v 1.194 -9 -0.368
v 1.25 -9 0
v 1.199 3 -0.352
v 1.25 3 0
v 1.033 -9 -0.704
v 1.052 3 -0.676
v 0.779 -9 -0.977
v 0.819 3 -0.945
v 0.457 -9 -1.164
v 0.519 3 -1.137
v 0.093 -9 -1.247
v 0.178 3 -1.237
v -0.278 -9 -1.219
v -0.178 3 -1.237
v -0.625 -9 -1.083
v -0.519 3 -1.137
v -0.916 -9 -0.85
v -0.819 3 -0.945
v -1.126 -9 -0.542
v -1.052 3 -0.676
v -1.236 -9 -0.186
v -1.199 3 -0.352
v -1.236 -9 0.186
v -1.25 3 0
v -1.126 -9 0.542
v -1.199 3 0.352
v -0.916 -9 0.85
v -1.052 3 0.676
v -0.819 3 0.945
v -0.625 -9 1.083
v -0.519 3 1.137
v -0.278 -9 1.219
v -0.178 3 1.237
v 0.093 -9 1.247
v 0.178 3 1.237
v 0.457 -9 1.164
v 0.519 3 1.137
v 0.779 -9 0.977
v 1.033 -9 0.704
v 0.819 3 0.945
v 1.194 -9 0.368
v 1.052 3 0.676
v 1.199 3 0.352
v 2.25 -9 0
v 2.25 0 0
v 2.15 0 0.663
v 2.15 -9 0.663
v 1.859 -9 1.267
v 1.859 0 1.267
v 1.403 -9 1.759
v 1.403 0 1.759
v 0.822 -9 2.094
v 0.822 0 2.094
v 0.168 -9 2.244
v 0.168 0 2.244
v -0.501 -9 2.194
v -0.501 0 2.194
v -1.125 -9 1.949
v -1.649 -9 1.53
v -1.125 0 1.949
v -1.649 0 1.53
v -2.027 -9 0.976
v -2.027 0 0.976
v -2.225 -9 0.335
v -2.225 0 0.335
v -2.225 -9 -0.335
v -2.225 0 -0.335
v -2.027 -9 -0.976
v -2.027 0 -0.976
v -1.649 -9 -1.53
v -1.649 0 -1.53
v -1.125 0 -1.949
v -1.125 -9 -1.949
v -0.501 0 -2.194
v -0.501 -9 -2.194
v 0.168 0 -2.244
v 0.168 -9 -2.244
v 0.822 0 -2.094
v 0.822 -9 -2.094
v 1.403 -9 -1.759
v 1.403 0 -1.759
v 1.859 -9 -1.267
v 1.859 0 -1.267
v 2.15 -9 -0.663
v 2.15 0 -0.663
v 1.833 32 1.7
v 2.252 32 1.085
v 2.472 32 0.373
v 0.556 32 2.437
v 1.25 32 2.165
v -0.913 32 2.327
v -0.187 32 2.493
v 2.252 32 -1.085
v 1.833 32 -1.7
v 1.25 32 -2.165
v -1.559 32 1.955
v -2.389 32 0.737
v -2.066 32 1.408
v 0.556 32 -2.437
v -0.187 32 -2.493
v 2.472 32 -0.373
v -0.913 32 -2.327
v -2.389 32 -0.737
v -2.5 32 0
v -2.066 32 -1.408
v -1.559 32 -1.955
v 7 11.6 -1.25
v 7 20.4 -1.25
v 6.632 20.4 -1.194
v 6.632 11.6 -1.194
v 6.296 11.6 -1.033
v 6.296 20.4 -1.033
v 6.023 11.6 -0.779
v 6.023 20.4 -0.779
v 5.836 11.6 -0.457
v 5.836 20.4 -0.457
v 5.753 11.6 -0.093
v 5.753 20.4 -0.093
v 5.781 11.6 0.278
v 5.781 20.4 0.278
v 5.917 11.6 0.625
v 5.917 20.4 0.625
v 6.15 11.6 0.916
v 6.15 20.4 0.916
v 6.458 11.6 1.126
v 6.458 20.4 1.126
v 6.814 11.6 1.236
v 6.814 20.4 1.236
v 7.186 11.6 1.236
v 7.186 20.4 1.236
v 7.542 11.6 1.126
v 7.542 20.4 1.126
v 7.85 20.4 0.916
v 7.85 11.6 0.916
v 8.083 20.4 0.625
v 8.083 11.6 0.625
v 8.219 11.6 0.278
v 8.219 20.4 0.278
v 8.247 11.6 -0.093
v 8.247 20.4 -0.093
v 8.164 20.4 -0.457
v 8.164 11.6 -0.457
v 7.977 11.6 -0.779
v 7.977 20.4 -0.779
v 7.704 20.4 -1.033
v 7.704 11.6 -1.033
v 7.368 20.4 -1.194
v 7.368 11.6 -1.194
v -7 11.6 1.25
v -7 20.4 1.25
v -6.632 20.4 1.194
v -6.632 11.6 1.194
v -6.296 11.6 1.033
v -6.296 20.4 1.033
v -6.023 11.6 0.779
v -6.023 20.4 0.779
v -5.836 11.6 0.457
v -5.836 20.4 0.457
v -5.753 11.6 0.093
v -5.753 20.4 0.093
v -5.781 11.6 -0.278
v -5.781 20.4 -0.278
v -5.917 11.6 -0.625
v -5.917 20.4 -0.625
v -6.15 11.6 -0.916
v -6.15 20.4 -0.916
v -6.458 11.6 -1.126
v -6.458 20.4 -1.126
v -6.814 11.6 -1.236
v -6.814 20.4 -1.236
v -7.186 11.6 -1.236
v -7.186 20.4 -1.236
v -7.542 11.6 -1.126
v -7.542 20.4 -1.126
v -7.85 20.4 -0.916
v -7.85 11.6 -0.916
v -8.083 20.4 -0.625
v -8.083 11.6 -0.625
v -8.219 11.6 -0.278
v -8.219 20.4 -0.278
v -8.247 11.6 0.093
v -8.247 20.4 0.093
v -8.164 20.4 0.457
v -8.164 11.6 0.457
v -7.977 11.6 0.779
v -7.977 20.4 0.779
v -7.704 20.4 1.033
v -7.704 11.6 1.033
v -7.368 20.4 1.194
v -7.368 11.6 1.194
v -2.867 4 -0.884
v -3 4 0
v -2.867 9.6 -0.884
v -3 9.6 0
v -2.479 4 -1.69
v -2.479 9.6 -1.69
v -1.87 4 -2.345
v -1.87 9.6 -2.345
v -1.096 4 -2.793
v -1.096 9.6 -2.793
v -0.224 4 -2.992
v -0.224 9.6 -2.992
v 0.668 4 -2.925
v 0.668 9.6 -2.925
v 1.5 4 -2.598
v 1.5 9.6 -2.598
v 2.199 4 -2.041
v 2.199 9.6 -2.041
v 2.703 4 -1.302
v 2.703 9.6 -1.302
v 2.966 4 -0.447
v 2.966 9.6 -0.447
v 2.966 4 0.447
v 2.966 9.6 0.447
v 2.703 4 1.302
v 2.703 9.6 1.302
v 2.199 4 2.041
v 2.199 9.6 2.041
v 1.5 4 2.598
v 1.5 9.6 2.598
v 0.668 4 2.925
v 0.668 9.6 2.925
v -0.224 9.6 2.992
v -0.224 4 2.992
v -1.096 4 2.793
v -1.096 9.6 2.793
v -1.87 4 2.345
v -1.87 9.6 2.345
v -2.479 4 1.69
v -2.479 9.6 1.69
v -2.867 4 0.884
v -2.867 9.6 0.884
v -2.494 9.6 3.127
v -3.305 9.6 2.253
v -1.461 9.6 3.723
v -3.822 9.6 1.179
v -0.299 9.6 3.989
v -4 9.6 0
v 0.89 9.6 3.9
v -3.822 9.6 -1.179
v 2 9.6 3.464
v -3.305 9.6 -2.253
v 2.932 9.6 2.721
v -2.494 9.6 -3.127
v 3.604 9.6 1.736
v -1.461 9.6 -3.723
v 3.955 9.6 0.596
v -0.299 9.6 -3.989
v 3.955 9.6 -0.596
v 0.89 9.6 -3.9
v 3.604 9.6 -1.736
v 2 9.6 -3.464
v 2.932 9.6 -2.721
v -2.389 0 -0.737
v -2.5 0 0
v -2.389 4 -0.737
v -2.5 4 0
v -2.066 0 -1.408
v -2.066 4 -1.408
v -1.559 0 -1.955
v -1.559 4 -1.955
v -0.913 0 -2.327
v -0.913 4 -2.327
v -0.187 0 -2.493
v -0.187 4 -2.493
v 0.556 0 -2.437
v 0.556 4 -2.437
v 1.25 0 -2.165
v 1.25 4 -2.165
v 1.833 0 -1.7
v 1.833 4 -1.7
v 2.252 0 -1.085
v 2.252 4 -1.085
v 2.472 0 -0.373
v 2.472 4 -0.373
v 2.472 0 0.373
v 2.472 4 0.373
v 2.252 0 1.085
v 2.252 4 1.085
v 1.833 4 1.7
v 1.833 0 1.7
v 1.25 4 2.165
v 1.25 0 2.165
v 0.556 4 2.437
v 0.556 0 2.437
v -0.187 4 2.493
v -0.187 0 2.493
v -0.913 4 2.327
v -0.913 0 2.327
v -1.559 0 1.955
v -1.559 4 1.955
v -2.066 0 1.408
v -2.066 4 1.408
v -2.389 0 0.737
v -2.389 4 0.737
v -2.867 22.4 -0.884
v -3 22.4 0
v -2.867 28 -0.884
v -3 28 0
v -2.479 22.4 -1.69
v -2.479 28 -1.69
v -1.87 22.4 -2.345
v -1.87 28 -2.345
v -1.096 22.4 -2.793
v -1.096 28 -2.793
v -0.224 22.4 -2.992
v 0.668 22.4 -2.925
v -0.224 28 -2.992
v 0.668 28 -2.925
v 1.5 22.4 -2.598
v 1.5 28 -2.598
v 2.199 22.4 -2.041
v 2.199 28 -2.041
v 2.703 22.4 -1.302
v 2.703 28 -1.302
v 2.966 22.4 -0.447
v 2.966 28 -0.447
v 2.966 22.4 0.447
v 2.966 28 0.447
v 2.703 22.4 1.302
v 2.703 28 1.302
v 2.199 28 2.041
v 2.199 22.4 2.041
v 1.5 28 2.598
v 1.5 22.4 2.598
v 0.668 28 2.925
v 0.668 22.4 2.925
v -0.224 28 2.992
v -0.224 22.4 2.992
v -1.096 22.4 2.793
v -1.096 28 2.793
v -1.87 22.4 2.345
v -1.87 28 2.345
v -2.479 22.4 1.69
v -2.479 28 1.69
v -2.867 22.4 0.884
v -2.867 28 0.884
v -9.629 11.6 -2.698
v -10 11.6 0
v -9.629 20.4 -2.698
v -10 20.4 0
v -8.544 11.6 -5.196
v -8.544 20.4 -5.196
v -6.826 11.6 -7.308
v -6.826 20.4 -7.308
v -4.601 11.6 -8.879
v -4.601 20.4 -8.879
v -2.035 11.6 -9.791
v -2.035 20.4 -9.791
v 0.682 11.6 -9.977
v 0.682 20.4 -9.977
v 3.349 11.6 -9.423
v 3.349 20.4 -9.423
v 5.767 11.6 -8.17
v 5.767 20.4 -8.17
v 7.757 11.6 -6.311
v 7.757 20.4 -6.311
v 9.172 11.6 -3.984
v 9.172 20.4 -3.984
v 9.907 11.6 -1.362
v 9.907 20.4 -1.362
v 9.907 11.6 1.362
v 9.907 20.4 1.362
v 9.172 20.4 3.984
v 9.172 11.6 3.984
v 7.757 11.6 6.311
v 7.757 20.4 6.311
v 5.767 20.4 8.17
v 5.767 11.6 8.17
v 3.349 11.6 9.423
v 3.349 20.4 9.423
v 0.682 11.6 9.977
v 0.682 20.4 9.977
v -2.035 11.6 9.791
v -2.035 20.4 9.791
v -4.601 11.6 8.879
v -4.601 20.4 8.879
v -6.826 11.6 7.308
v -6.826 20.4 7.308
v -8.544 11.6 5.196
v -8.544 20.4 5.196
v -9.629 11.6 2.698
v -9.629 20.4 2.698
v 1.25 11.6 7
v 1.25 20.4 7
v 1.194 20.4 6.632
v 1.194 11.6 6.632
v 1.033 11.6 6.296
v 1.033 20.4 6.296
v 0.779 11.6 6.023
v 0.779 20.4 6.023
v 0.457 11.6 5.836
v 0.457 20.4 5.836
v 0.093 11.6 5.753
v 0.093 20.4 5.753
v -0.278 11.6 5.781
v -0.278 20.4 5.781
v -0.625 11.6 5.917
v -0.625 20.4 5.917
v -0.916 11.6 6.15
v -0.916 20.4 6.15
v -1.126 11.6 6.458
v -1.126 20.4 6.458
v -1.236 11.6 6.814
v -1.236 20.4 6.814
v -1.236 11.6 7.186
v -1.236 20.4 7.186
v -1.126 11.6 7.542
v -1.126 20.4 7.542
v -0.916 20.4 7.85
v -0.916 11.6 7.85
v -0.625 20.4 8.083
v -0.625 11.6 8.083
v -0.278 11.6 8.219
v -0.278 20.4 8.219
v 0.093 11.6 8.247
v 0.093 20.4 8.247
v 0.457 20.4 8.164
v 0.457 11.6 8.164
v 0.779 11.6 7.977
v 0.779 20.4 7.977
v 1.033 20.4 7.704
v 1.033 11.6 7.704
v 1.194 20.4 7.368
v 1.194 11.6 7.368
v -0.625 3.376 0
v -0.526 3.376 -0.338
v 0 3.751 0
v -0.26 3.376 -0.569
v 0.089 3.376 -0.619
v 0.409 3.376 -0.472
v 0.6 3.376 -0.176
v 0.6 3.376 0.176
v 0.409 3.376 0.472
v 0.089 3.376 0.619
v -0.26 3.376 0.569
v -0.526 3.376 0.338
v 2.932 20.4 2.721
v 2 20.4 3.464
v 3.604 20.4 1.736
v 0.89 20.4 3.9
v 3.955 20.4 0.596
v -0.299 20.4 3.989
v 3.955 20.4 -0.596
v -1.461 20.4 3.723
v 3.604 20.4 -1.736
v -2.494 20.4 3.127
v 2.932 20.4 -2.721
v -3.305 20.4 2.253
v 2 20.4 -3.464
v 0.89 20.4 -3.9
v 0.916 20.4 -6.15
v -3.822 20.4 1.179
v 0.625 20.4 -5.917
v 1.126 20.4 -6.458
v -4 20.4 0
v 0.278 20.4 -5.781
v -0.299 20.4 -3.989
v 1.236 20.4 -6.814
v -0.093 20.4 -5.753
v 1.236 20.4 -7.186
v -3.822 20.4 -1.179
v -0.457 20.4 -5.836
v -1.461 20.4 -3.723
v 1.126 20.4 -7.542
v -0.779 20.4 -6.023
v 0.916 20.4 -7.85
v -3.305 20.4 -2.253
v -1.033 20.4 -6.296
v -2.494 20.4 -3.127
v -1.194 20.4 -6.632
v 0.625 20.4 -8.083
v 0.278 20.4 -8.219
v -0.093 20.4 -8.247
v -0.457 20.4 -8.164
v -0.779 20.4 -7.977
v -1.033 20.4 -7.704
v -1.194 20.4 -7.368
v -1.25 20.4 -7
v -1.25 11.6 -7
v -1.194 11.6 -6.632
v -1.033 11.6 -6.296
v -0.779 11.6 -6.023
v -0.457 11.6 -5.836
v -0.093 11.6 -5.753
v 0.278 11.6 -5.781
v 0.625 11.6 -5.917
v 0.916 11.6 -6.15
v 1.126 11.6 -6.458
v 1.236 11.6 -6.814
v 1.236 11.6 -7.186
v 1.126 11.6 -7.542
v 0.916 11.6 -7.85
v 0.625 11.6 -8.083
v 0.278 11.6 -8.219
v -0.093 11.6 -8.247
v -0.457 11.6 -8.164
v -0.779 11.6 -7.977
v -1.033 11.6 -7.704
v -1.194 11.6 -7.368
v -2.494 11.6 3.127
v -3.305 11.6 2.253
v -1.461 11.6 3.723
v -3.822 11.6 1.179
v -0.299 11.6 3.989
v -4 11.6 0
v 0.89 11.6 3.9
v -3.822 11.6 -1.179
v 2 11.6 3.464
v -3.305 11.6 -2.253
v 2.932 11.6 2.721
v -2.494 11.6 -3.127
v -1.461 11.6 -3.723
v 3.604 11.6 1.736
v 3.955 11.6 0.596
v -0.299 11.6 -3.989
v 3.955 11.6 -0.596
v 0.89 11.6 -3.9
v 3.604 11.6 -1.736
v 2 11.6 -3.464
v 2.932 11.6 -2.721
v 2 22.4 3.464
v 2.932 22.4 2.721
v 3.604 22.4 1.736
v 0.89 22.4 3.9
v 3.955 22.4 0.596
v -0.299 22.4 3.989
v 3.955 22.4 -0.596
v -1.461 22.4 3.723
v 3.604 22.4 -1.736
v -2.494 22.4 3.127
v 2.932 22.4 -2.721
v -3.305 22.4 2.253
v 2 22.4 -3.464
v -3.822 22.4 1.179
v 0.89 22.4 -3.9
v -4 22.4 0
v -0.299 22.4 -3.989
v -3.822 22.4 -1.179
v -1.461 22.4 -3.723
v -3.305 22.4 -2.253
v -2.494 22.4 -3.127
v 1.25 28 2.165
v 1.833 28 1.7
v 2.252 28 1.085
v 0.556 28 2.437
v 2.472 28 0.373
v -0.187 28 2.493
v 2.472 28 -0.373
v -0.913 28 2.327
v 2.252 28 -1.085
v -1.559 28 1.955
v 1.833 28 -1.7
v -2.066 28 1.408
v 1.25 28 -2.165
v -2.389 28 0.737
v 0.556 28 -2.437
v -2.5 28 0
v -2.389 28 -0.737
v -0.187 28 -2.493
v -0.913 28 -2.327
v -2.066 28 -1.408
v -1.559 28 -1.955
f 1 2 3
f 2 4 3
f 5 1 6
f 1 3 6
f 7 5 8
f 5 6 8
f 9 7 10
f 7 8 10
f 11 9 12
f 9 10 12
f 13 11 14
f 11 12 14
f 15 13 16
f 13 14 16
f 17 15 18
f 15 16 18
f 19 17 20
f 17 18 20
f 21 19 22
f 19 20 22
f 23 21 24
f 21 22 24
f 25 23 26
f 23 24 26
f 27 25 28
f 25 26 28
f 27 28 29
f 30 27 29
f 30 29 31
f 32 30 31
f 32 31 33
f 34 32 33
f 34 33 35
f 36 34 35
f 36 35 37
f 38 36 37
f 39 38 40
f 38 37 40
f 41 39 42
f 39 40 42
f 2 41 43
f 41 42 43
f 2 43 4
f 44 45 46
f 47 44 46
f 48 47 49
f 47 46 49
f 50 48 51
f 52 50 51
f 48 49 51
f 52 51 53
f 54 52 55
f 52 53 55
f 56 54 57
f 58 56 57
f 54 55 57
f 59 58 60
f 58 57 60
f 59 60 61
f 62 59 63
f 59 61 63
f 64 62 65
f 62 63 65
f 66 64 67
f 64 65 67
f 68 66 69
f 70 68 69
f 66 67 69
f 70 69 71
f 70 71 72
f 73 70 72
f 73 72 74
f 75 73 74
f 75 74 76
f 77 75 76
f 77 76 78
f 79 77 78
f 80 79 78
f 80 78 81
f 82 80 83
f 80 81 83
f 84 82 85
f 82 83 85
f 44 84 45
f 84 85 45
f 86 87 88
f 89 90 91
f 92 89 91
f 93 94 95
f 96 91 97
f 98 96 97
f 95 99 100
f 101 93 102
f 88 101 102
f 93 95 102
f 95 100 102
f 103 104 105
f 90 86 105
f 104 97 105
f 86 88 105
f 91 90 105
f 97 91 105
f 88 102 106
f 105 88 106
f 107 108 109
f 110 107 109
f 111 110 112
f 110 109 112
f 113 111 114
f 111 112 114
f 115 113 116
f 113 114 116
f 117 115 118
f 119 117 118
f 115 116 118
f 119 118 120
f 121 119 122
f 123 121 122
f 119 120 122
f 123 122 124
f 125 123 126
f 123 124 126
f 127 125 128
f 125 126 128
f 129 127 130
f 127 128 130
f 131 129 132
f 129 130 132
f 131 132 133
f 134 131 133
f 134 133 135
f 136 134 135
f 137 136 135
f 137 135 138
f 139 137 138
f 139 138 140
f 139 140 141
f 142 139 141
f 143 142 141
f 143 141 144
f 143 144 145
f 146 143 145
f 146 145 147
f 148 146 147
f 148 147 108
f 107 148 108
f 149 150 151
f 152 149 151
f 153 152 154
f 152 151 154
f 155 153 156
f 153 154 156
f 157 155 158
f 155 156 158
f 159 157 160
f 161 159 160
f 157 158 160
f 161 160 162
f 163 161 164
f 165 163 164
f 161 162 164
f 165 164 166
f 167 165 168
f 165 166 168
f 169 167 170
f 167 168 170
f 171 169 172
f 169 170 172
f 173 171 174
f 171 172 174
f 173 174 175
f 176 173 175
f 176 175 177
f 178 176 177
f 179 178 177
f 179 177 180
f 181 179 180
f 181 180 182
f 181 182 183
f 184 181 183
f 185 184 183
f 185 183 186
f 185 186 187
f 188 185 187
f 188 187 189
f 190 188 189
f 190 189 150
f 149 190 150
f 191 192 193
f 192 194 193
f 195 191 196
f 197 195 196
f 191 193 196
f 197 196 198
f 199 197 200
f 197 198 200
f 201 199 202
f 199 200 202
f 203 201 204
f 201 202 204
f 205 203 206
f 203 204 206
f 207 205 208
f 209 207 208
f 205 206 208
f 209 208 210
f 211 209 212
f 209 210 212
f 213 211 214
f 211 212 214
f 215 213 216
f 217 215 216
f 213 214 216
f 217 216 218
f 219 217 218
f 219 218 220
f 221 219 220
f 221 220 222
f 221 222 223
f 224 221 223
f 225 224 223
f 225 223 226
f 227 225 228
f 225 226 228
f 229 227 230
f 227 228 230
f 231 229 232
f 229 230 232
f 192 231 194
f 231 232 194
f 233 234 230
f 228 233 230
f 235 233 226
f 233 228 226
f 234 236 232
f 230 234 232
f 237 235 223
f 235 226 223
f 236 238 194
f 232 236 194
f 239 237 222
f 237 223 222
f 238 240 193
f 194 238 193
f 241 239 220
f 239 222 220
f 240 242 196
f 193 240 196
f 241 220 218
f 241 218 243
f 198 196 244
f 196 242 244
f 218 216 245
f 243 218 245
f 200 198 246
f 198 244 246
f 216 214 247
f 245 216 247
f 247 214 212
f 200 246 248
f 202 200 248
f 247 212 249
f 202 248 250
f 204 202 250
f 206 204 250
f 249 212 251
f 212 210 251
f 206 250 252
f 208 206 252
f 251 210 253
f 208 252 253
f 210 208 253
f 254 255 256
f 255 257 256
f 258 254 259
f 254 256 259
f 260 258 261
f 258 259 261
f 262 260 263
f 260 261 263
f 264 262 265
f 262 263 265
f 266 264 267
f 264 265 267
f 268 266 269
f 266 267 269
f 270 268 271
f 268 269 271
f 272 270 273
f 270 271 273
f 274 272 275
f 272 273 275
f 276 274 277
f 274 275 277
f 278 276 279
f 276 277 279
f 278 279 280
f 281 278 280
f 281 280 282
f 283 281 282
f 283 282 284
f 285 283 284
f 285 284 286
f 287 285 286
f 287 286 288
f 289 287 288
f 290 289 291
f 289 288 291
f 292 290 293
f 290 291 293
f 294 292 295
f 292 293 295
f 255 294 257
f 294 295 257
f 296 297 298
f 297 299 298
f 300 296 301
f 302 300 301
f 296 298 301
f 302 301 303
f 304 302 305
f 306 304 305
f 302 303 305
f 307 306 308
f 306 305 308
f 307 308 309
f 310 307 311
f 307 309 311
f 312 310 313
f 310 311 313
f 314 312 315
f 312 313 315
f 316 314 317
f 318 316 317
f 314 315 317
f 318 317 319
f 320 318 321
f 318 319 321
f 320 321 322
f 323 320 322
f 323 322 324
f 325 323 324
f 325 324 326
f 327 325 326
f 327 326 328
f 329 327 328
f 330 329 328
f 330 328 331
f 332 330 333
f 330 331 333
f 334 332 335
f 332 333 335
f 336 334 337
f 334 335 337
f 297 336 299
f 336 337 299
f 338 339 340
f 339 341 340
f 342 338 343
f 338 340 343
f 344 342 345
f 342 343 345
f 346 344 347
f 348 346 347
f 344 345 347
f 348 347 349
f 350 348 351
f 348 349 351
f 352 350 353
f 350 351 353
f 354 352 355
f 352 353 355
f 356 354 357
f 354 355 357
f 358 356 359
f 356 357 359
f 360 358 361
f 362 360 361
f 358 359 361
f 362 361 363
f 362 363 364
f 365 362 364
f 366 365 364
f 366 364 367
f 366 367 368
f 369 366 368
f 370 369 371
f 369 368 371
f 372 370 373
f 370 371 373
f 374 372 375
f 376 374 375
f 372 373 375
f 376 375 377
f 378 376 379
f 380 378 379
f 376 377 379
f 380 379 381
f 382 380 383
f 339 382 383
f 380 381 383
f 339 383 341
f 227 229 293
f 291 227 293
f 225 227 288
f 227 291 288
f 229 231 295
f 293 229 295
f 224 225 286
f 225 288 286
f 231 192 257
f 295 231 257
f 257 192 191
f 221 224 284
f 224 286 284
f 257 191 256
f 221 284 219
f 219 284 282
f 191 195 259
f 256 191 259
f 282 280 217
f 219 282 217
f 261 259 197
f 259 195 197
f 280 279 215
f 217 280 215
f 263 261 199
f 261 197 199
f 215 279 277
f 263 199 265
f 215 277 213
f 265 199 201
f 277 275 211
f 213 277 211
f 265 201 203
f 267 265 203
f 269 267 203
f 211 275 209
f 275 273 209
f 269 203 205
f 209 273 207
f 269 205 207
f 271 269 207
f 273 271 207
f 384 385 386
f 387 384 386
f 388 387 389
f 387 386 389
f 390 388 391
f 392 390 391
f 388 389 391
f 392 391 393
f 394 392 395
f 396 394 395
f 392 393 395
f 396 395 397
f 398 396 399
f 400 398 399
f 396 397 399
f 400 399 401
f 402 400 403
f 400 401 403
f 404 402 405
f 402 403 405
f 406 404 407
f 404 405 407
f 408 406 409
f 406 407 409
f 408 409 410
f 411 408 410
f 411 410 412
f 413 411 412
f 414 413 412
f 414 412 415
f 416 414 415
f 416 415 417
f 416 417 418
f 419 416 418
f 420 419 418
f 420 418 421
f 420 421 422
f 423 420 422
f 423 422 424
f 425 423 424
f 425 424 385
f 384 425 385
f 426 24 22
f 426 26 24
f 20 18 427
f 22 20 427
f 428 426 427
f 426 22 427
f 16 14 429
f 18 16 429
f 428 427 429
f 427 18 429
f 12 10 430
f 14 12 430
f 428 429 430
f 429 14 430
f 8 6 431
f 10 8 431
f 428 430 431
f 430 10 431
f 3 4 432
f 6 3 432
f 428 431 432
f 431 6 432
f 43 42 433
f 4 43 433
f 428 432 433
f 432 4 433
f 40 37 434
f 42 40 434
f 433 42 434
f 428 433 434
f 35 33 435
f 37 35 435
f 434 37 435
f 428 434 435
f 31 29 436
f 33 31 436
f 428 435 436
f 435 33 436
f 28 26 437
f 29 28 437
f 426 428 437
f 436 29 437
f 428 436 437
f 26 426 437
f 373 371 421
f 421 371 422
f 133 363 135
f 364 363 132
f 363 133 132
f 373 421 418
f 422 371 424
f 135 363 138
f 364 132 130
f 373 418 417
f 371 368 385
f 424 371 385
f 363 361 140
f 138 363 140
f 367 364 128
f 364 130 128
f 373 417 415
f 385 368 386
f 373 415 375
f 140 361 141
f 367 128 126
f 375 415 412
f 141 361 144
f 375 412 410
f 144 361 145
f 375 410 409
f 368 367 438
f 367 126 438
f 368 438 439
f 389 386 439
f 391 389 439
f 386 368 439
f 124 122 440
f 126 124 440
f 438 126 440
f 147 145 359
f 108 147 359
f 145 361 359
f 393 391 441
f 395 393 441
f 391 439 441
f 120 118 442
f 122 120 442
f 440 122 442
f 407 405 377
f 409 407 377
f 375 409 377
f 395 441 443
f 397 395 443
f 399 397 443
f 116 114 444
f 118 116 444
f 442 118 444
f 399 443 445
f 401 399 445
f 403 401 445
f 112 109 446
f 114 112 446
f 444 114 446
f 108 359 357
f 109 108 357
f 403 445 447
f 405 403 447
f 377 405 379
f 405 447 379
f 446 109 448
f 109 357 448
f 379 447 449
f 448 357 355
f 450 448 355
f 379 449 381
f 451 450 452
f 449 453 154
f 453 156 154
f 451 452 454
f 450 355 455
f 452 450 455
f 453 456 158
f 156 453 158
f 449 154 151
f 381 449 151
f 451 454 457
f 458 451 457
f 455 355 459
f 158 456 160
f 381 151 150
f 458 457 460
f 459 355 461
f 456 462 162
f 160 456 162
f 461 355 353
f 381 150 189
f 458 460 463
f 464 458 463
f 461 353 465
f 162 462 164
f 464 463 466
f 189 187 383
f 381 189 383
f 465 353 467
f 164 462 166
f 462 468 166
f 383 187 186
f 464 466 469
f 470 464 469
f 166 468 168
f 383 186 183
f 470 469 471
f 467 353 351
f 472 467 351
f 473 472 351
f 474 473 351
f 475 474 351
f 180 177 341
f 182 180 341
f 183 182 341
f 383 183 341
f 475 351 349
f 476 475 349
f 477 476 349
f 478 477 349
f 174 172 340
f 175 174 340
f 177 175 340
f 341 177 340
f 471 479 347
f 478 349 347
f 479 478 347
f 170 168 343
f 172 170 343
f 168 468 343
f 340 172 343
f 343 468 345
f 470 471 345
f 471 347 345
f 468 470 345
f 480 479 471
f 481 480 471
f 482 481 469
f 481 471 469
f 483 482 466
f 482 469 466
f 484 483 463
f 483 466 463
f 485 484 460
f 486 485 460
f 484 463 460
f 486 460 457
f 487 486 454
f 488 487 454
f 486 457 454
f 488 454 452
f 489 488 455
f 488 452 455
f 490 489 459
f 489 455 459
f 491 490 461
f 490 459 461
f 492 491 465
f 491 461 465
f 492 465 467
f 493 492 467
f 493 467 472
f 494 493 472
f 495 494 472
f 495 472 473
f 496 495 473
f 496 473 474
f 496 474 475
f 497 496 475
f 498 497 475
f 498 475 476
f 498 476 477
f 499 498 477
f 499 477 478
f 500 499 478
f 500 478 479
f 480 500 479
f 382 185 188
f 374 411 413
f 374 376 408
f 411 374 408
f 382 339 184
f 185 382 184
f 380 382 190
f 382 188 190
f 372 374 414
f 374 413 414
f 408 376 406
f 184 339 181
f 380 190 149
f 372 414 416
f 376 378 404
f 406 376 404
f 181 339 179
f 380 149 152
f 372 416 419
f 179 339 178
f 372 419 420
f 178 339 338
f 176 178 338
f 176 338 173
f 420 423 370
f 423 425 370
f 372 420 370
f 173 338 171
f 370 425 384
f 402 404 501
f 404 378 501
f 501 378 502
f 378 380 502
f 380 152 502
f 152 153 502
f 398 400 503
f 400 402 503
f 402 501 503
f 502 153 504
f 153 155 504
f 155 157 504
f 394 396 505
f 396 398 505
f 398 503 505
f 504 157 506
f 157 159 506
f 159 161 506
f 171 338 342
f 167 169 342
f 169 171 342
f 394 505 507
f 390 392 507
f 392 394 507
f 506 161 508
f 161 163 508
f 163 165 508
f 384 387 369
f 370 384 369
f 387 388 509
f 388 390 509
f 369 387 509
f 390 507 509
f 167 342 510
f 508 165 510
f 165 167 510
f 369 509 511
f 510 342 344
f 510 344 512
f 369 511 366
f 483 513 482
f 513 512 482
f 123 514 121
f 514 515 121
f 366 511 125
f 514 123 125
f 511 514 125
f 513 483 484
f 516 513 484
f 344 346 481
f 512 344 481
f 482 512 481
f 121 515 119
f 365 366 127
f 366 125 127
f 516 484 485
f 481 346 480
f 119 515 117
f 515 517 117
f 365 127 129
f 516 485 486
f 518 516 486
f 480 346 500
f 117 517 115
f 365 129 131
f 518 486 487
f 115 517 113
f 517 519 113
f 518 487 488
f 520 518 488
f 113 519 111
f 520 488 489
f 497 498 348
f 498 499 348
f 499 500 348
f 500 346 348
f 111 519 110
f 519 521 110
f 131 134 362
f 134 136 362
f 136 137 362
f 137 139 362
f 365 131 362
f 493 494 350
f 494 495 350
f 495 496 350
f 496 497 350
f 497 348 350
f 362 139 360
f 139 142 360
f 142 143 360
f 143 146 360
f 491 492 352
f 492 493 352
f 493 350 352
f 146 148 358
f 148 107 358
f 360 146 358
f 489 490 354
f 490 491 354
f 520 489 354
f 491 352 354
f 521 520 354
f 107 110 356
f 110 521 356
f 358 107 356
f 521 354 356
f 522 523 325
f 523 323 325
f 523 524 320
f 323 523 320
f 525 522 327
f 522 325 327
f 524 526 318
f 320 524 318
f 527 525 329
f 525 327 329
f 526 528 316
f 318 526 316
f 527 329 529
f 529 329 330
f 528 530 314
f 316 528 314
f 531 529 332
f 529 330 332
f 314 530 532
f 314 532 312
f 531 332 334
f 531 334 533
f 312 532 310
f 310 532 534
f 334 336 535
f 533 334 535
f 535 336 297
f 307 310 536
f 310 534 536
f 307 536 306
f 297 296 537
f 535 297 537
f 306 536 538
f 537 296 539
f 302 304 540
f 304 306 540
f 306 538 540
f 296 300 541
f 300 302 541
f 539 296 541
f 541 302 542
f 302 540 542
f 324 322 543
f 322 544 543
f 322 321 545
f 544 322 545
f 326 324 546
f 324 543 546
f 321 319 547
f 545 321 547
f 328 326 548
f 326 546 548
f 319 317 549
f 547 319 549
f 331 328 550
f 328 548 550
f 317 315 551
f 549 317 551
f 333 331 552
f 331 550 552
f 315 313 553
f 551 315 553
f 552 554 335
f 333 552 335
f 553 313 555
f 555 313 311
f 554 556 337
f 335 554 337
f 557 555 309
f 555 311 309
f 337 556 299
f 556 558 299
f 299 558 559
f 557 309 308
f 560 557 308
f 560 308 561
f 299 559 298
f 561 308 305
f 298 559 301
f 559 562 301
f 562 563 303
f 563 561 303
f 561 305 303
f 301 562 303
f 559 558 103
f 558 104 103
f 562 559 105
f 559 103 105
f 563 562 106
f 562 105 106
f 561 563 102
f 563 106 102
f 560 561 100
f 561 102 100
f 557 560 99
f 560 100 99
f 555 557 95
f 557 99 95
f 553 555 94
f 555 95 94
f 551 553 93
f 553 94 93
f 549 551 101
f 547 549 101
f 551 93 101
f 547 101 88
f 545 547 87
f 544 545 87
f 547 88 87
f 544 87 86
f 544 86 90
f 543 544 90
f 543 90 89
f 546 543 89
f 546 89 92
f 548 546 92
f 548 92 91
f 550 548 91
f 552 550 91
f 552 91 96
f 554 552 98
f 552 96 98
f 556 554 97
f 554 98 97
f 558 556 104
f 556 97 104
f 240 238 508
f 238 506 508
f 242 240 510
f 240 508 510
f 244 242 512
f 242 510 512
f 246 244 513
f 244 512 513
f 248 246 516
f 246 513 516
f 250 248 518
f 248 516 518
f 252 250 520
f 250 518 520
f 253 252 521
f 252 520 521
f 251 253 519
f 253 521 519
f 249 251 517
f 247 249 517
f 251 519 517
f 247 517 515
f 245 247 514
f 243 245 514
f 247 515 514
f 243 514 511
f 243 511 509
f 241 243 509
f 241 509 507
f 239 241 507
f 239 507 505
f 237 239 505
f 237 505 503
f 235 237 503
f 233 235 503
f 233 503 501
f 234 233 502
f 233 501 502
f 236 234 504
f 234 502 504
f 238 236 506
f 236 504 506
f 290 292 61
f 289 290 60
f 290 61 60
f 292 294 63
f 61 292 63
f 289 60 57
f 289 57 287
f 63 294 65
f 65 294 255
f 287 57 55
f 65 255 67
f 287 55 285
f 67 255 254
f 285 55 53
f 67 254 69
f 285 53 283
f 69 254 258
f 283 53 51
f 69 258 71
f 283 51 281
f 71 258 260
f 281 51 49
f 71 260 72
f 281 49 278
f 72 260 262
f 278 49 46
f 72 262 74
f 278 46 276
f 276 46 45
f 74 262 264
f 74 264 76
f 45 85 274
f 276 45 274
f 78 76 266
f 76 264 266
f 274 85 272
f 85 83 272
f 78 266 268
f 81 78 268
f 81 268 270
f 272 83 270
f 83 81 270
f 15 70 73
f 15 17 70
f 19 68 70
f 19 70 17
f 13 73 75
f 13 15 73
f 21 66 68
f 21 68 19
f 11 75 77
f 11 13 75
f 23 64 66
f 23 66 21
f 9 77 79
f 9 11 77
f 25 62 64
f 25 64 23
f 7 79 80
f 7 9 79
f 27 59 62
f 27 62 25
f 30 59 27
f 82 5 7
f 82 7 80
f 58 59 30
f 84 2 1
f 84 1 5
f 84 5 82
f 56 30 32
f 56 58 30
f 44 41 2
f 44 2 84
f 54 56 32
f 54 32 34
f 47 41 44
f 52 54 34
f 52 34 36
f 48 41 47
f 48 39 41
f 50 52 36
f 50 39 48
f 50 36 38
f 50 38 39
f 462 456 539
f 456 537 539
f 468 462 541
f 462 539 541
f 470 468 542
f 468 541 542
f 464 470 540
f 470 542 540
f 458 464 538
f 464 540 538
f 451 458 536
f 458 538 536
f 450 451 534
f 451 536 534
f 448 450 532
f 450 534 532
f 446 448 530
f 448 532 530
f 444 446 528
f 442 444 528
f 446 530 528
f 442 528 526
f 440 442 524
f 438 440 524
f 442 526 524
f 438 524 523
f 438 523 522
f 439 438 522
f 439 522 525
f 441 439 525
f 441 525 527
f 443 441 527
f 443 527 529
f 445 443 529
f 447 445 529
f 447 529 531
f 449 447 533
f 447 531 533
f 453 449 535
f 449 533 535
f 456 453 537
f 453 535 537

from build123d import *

# Parameters (mm, degrees)
HOLE_WIZARD_M3_1_D       = 2.5
PATTERN_CIRCULAR_1_COUNT = 4
SKETCH_5_R               = 2.25
EXTRUDE_1_DEPTH          = 9
HOLE_WIZARD_M3_2_D       = 2.5
HOLE_WIZARD_M3_2_DEPTH   = 12
HOLE_WIZARD_M3_2_TIP     = 0.751075774


with BuildPart() as part:
    # Model → 旋转1 (revolve)
    with BuildSketch(Plane.XY, mode=Mode.PRIVATE) as revolve_1_sk:
        Polygon((0, 32), (0, 0), (2.5, 0), (2.5, 4), (3, 4), (3, 9.6), (4, 9.6), (4, 11.6), (10, 11.6), (10, 20.4), (4, 20.4), (4, 22.4), (3, 22.4), (3, 28), (2.5, 28), (2.5, 32), align=None)
    revolve(revolve_1_sk.sketch.rotate(Axis((0, 32, 0), (0, -1, 0)), 180), axis=Axis((0, 32, 0), (0, -1, 0)))

    # M3 螺纹孔1 (through all)
    with Locations(Plane(origin=(0, 11.6, 7), x_dir=(-1, 0, 0), z_dir=(0, -1, 0))):
        with Locations((0, 0)):
            hole_wizard_m3_1 = Hole(HOLE_WIZARD_M3_1_D / 2)

    # 阵列(圆周)1: M3 螺纹孔1 ×4 about axis
    pattern_circular_1_axis = Axis((0, 0, 0), (0, 1, 0))
    for i in range(1, PATTERN_CIRCULAR_1_COUNT):
        add(hole_wizard_m3_1.rotate(pattern_circular_1_axis, i * 360 / PATTERN_CIRCULAR_1_COUNT), mode=Mode.SUBTRACT)

    # 草图5 → 凸台-拉伸1 (add)
    with BuildSketch(Plane.XZ):
        Circle(SKETCH_5_R)
    extrude(amount=EXTRUDE_1_DEPTH)

    # M3 螺纹孔2
    with Locations(Plane(origin=(0, -9, 0), x_dir=(-1, 0, 0), z_dir=(0, -1, 0))):
        with Locations((0, 0)):
            Hole(HOLE_WIZARD_M3_2_D / 2, depth=HOLE_WIZARD_M3_2_DEPTH)
            with Locations((0, 0, -(HOLE_WIZARD_M3_2_DEPTH + HOLE_WIZARD_M3_2_TIP / 2))):  # 118° drill point
                Cone(0, HOLE_WIZARD_M3_2_D / 2, HOLE_WIZARD_M3_2_TIP, mode=Mode.SUBTRACT)


solid = part.part
